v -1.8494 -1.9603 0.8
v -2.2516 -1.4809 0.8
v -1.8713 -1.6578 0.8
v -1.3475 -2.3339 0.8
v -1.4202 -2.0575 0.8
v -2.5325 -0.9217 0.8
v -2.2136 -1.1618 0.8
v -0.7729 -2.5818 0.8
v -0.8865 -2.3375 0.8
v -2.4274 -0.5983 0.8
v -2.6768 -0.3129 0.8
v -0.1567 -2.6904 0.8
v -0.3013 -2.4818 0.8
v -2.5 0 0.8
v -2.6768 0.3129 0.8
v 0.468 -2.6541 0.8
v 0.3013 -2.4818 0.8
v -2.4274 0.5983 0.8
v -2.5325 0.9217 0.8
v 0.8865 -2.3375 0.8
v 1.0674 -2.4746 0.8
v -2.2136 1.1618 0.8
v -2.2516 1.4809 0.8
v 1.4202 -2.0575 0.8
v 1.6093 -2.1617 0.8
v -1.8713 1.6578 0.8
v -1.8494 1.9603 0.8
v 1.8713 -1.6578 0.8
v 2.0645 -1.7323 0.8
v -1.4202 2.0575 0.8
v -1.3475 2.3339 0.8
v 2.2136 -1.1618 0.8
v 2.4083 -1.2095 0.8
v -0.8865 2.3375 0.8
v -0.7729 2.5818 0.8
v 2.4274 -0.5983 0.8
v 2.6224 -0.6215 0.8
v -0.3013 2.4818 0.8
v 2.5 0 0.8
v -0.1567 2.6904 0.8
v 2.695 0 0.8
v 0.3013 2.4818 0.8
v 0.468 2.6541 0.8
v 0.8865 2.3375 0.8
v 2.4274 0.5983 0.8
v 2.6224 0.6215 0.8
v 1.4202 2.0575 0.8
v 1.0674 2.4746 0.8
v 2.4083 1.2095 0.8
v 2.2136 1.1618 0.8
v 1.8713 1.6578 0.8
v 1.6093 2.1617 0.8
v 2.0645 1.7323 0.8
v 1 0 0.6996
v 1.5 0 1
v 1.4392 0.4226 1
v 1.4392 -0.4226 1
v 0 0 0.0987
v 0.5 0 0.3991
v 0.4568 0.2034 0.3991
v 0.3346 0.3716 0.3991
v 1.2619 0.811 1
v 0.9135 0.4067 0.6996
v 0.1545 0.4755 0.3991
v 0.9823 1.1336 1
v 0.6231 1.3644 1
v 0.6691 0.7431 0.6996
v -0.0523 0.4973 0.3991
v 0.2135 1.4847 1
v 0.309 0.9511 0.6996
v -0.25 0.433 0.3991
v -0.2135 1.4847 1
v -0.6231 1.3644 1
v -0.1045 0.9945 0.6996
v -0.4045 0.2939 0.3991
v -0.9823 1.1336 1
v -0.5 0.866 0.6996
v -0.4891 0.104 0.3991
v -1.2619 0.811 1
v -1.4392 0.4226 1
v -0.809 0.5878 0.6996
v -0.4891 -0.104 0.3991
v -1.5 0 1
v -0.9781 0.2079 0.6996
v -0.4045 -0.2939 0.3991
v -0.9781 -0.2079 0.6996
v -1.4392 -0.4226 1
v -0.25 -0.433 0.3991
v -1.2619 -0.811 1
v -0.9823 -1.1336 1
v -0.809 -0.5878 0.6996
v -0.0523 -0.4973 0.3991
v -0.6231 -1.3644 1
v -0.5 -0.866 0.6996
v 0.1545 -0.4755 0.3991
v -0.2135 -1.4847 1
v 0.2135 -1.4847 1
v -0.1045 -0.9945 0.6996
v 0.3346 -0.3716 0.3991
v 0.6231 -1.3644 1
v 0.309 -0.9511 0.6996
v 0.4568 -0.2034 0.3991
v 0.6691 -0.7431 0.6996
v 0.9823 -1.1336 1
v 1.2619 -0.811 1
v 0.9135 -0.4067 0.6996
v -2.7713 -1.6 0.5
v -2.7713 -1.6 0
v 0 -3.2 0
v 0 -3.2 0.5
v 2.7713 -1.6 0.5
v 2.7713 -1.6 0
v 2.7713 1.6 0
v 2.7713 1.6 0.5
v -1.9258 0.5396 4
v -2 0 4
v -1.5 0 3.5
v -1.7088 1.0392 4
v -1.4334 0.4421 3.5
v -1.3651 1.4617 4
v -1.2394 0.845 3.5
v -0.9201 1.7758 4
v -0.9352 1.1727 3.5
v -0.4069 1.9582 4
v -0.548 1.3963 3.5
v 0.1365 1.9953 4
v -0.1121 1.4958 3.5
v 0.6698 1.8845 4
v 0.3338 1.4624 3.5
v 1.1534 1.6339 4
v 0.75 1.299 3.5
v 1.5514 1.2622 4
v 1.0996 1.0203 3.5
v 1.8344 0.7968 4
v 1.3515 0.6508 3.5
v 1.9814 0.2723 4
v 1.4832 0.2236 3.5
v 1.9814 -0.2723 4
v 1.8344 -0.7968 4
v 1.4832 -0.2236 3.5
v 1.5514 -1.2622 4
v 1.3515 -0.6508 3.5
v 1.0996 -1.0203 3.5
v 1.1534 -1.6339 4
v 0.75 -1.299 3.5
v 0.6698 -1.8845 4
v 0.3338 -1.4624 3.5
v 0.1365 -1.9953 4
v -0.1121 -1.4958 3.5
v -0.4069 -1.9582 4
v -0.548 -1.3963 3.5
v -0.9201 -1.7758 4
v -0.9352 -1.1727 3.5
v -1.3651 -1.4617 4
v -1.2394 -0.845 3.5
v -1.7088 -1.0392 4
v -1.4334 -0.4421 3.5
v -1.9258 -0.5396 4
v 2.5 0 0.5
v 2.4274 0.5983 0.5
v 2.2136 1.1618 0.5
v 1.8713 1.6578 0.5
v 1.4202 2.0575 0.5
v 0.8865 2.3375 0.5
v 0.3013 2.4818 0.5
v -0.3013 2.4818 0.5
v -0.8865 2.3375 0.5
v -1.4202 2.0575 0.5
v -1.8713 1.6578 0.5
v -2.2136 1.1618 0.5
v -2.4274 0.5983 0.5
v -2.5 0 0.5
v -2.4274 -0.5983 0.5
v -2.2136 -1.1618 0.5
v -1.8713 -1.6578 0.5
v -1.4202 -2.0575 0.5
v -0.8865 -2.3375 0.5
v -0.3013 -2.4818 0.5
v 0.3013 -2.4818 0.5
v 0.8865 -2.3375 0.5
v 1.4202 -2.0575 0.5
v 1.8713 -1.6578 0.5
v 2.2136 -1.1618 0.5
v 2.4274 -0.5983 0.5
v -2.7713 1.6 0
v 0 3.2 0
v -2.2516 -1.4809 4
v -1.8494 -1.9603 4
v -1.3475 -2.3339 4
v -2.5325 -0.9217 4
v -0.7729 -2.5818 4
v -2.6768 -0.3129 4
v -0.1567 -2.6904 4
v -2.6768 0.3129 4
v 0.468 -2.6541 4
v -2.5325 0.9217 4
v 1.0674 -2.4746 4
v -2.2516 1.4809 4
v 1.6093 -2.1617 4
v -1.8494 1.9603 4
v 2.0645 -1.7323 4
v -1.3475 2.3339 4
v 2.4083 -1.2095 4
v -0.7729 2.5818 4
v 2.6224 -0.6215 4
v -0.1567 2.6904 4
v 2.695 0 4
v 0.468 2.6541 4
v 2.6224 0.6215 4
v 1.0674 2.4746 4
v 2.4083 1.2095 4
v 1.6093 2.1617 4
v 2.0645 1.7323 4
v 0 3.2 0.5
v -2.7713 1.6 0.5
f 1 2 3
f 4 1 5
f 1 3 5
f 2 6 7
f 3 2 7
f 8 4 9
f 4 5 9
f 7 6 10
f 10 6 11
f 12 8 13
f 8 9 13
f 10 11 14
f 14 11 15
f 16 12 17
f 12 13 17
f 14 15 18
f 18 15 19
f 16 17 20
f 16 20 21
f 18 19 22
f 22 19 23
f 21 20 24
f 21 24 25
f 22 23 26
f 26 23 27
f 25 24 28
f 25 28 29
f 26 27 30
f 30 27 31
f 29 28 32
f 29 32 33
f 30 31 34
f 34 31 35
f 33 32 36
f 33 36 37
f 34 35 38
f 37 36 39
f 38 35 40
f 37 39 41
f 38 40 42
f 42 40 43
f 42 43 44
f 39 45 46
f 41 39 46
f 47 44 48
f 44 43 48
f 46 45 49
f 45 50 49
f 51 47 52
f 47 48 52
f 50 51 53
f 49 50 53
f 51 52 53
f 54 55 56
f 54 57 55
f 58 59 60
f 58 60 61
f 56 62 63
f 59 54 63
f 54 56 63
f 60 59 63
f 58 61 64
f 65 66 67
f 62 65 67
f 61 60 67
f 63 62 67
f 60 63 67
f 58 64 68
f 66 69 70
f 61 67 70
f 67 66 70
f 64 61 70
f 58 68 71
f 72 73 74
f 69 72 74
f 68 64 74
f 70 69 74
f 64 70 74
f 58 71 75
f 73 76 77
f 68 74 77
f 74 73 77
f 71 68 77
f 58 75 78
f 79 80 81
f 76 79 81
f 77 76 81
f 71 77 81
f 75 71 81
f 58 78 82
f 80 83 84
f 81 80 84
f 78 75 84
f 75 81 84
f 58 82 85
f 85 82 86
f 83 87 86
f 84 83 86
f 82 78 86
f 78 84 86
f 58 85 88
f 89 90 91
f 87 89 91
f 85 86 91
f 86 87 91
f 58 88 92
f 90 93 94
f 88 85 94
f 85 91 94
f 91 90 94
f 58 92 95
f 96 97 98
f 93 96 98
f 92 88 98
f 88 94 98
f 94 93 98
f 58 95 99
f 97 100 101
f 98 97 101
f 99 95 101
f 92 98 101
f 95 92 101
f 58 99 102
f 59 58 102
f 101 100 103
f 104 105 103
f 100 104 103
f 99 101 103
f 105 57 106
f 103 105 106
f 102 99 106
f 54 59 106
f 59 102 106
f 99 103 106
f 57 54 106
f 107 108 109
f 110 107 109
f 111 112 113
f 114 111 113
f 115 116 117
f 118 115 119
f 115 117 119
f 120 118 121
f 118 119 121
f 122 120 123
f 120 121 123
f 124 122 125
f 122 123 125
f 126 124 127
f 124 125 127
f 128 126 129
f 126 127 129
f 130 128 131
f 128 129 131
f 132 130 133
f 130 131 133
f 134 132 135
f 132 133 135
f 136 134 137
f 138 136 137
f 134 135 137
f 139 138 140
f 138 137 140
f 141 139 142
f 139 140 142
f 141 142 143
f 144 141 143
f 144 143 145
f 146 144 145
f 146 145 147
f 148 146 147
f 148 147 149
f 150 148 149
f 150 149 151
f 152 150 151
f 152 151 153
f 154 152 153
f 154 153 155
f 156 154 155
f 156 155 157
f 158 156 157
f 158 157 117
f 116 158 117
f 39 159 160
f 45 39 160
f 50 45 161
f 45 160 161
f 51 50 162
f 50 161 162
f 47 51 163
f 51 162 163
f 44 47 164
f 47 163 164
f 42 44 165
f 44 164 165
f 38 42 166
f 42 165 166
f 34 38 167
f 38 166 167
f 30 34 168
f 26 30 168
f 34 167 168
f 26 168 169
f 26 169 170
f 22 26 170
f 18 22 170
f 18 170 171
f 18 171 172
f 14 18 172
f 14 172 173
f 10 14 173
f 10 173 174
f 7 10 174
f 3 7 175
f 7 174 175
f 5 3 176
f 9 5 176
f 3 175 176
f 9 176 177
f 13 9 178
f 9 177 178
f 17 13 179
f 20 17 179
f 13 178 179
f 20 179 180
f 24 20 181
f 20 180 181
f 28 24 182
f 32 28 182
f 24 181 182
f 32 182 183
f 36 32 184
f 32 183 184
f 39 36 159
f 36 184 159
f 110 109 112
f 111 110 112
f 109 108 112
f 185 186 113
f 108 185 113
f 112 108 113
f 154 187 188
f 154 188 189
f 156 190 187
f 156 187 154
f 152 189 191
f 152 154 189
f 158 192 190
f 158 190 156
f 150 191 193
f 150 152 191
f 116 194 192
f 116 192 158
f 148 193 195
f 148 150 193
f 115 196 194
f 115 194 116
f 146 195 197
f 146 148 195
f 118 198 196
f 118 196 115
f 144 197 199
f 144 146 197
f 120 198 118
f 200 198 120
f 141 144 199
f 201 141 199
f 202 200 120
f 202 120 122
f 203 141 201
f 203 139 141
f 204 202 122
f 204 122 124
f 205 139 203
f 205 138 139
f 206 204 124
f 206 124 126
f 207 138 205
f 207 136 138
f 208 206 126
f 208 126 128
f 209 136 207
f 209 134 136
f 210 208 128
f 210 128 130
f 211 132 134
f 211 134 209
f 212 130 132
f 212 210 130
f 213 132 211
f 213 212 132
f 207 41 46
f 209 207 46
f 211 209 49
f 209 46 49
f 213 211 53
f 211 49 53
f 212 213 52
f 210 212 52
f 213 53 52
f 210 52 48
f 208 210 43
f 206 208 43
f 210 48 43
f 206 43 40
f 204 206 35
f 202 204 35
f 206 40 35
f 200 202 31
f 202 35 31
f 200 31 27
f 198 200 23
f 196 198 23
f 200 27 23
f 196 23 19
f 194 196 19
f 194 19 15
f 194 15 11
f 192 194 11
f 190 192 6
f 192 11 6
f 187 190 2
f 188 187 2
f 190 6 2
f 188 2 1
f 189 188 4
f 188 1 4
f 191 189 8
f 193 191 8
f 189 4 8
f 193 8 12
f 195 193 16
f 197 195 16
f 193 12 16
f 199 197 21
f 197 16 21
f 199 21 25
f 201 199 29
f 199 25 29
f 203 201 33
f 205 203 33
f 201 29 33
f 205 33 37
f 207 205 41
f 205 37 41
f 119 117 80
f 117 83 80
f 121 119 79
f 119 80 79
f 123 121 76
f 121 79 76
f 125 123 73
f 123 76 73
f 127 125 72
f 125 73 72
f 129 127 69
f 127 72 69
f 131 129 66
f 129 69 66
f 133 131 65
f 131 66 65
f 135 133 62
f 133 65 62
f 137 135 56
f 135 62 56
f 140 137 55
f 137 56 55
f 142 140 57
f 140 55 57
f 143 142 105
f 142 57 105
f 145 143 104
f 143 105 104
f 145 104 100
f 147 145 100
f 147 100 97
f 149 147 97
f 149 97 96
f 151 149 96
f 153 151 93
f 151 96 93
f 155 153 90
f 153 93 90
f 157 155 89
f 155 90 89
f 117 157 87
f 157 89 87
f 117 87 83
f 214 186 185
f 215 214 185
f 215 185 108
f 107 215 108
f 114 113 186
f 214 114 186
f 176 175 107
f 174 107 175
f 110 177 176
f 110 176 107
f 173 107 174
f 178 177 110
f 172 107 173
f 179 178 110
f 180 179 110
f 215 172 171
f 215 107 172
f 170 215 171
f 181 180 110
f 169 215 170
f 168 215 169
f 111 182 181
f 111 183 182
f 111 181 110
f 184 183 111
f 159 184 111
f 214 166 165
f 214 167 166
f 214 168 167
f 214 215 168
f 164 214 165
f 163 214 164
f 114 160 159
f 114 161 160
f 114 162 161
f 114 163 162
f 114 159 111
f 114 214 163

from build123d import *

# Parameters (mm, degrees)
F1_DEPTH       = 0.5
F2_R           = 2.5
F3_DEPTH       = 0.3
F4_R           = 2.695
F5_DEPTH       = 3.2
F7_D           = 3
F7_DEPTH       = 3
F7_CSINK_D     = 4
F7_CSINK_ANGLE = 90
F7_TIP         = 0.9012909285


with BuildPart() as f1:
    # F0 (on Top) → F1 (new body)
    with BuildSketch(Plane.XY):
        Polygon((-2.7712812921, -1.6), (0, -3.2), (2.7712812921, -1.6), (2.7712812921, 1.6), (0, 3.2), (-2.7712812921, 1.6), align=None)
    extrude(amount=F1_DEPTH)

    # F2 (on face) → F3 (join)
    with BuildSketch(Plane.XY.offset(0.5)):
        Circle(F2_R)
    extrude(amount=F3_DEPTH)

    # F4 (on face) → F5 (join)
    with BuildSketch(Plane.XY.offset(0.8)):
        Circle(F4_R)
    extrude(amount=F5_DEPTH)

    # F7
    with Locations(Plane.XY.offset(4)):
        with Locations((0, 0)):
            CounterSinkHole(F7_D / 2, F7_CSINK_D / 2, depth=F7_DEPTH, counter_sink_angle=F7_CSINK_ANGLE)
            with Locations((0, 0, -(F7_DEPTH + F7_TIP / 2))):  # 118° drill point
                Cone(0, F7_D / 2, F7_TIP, mode=Mode.SUBTRACT)


solid = f1.part
